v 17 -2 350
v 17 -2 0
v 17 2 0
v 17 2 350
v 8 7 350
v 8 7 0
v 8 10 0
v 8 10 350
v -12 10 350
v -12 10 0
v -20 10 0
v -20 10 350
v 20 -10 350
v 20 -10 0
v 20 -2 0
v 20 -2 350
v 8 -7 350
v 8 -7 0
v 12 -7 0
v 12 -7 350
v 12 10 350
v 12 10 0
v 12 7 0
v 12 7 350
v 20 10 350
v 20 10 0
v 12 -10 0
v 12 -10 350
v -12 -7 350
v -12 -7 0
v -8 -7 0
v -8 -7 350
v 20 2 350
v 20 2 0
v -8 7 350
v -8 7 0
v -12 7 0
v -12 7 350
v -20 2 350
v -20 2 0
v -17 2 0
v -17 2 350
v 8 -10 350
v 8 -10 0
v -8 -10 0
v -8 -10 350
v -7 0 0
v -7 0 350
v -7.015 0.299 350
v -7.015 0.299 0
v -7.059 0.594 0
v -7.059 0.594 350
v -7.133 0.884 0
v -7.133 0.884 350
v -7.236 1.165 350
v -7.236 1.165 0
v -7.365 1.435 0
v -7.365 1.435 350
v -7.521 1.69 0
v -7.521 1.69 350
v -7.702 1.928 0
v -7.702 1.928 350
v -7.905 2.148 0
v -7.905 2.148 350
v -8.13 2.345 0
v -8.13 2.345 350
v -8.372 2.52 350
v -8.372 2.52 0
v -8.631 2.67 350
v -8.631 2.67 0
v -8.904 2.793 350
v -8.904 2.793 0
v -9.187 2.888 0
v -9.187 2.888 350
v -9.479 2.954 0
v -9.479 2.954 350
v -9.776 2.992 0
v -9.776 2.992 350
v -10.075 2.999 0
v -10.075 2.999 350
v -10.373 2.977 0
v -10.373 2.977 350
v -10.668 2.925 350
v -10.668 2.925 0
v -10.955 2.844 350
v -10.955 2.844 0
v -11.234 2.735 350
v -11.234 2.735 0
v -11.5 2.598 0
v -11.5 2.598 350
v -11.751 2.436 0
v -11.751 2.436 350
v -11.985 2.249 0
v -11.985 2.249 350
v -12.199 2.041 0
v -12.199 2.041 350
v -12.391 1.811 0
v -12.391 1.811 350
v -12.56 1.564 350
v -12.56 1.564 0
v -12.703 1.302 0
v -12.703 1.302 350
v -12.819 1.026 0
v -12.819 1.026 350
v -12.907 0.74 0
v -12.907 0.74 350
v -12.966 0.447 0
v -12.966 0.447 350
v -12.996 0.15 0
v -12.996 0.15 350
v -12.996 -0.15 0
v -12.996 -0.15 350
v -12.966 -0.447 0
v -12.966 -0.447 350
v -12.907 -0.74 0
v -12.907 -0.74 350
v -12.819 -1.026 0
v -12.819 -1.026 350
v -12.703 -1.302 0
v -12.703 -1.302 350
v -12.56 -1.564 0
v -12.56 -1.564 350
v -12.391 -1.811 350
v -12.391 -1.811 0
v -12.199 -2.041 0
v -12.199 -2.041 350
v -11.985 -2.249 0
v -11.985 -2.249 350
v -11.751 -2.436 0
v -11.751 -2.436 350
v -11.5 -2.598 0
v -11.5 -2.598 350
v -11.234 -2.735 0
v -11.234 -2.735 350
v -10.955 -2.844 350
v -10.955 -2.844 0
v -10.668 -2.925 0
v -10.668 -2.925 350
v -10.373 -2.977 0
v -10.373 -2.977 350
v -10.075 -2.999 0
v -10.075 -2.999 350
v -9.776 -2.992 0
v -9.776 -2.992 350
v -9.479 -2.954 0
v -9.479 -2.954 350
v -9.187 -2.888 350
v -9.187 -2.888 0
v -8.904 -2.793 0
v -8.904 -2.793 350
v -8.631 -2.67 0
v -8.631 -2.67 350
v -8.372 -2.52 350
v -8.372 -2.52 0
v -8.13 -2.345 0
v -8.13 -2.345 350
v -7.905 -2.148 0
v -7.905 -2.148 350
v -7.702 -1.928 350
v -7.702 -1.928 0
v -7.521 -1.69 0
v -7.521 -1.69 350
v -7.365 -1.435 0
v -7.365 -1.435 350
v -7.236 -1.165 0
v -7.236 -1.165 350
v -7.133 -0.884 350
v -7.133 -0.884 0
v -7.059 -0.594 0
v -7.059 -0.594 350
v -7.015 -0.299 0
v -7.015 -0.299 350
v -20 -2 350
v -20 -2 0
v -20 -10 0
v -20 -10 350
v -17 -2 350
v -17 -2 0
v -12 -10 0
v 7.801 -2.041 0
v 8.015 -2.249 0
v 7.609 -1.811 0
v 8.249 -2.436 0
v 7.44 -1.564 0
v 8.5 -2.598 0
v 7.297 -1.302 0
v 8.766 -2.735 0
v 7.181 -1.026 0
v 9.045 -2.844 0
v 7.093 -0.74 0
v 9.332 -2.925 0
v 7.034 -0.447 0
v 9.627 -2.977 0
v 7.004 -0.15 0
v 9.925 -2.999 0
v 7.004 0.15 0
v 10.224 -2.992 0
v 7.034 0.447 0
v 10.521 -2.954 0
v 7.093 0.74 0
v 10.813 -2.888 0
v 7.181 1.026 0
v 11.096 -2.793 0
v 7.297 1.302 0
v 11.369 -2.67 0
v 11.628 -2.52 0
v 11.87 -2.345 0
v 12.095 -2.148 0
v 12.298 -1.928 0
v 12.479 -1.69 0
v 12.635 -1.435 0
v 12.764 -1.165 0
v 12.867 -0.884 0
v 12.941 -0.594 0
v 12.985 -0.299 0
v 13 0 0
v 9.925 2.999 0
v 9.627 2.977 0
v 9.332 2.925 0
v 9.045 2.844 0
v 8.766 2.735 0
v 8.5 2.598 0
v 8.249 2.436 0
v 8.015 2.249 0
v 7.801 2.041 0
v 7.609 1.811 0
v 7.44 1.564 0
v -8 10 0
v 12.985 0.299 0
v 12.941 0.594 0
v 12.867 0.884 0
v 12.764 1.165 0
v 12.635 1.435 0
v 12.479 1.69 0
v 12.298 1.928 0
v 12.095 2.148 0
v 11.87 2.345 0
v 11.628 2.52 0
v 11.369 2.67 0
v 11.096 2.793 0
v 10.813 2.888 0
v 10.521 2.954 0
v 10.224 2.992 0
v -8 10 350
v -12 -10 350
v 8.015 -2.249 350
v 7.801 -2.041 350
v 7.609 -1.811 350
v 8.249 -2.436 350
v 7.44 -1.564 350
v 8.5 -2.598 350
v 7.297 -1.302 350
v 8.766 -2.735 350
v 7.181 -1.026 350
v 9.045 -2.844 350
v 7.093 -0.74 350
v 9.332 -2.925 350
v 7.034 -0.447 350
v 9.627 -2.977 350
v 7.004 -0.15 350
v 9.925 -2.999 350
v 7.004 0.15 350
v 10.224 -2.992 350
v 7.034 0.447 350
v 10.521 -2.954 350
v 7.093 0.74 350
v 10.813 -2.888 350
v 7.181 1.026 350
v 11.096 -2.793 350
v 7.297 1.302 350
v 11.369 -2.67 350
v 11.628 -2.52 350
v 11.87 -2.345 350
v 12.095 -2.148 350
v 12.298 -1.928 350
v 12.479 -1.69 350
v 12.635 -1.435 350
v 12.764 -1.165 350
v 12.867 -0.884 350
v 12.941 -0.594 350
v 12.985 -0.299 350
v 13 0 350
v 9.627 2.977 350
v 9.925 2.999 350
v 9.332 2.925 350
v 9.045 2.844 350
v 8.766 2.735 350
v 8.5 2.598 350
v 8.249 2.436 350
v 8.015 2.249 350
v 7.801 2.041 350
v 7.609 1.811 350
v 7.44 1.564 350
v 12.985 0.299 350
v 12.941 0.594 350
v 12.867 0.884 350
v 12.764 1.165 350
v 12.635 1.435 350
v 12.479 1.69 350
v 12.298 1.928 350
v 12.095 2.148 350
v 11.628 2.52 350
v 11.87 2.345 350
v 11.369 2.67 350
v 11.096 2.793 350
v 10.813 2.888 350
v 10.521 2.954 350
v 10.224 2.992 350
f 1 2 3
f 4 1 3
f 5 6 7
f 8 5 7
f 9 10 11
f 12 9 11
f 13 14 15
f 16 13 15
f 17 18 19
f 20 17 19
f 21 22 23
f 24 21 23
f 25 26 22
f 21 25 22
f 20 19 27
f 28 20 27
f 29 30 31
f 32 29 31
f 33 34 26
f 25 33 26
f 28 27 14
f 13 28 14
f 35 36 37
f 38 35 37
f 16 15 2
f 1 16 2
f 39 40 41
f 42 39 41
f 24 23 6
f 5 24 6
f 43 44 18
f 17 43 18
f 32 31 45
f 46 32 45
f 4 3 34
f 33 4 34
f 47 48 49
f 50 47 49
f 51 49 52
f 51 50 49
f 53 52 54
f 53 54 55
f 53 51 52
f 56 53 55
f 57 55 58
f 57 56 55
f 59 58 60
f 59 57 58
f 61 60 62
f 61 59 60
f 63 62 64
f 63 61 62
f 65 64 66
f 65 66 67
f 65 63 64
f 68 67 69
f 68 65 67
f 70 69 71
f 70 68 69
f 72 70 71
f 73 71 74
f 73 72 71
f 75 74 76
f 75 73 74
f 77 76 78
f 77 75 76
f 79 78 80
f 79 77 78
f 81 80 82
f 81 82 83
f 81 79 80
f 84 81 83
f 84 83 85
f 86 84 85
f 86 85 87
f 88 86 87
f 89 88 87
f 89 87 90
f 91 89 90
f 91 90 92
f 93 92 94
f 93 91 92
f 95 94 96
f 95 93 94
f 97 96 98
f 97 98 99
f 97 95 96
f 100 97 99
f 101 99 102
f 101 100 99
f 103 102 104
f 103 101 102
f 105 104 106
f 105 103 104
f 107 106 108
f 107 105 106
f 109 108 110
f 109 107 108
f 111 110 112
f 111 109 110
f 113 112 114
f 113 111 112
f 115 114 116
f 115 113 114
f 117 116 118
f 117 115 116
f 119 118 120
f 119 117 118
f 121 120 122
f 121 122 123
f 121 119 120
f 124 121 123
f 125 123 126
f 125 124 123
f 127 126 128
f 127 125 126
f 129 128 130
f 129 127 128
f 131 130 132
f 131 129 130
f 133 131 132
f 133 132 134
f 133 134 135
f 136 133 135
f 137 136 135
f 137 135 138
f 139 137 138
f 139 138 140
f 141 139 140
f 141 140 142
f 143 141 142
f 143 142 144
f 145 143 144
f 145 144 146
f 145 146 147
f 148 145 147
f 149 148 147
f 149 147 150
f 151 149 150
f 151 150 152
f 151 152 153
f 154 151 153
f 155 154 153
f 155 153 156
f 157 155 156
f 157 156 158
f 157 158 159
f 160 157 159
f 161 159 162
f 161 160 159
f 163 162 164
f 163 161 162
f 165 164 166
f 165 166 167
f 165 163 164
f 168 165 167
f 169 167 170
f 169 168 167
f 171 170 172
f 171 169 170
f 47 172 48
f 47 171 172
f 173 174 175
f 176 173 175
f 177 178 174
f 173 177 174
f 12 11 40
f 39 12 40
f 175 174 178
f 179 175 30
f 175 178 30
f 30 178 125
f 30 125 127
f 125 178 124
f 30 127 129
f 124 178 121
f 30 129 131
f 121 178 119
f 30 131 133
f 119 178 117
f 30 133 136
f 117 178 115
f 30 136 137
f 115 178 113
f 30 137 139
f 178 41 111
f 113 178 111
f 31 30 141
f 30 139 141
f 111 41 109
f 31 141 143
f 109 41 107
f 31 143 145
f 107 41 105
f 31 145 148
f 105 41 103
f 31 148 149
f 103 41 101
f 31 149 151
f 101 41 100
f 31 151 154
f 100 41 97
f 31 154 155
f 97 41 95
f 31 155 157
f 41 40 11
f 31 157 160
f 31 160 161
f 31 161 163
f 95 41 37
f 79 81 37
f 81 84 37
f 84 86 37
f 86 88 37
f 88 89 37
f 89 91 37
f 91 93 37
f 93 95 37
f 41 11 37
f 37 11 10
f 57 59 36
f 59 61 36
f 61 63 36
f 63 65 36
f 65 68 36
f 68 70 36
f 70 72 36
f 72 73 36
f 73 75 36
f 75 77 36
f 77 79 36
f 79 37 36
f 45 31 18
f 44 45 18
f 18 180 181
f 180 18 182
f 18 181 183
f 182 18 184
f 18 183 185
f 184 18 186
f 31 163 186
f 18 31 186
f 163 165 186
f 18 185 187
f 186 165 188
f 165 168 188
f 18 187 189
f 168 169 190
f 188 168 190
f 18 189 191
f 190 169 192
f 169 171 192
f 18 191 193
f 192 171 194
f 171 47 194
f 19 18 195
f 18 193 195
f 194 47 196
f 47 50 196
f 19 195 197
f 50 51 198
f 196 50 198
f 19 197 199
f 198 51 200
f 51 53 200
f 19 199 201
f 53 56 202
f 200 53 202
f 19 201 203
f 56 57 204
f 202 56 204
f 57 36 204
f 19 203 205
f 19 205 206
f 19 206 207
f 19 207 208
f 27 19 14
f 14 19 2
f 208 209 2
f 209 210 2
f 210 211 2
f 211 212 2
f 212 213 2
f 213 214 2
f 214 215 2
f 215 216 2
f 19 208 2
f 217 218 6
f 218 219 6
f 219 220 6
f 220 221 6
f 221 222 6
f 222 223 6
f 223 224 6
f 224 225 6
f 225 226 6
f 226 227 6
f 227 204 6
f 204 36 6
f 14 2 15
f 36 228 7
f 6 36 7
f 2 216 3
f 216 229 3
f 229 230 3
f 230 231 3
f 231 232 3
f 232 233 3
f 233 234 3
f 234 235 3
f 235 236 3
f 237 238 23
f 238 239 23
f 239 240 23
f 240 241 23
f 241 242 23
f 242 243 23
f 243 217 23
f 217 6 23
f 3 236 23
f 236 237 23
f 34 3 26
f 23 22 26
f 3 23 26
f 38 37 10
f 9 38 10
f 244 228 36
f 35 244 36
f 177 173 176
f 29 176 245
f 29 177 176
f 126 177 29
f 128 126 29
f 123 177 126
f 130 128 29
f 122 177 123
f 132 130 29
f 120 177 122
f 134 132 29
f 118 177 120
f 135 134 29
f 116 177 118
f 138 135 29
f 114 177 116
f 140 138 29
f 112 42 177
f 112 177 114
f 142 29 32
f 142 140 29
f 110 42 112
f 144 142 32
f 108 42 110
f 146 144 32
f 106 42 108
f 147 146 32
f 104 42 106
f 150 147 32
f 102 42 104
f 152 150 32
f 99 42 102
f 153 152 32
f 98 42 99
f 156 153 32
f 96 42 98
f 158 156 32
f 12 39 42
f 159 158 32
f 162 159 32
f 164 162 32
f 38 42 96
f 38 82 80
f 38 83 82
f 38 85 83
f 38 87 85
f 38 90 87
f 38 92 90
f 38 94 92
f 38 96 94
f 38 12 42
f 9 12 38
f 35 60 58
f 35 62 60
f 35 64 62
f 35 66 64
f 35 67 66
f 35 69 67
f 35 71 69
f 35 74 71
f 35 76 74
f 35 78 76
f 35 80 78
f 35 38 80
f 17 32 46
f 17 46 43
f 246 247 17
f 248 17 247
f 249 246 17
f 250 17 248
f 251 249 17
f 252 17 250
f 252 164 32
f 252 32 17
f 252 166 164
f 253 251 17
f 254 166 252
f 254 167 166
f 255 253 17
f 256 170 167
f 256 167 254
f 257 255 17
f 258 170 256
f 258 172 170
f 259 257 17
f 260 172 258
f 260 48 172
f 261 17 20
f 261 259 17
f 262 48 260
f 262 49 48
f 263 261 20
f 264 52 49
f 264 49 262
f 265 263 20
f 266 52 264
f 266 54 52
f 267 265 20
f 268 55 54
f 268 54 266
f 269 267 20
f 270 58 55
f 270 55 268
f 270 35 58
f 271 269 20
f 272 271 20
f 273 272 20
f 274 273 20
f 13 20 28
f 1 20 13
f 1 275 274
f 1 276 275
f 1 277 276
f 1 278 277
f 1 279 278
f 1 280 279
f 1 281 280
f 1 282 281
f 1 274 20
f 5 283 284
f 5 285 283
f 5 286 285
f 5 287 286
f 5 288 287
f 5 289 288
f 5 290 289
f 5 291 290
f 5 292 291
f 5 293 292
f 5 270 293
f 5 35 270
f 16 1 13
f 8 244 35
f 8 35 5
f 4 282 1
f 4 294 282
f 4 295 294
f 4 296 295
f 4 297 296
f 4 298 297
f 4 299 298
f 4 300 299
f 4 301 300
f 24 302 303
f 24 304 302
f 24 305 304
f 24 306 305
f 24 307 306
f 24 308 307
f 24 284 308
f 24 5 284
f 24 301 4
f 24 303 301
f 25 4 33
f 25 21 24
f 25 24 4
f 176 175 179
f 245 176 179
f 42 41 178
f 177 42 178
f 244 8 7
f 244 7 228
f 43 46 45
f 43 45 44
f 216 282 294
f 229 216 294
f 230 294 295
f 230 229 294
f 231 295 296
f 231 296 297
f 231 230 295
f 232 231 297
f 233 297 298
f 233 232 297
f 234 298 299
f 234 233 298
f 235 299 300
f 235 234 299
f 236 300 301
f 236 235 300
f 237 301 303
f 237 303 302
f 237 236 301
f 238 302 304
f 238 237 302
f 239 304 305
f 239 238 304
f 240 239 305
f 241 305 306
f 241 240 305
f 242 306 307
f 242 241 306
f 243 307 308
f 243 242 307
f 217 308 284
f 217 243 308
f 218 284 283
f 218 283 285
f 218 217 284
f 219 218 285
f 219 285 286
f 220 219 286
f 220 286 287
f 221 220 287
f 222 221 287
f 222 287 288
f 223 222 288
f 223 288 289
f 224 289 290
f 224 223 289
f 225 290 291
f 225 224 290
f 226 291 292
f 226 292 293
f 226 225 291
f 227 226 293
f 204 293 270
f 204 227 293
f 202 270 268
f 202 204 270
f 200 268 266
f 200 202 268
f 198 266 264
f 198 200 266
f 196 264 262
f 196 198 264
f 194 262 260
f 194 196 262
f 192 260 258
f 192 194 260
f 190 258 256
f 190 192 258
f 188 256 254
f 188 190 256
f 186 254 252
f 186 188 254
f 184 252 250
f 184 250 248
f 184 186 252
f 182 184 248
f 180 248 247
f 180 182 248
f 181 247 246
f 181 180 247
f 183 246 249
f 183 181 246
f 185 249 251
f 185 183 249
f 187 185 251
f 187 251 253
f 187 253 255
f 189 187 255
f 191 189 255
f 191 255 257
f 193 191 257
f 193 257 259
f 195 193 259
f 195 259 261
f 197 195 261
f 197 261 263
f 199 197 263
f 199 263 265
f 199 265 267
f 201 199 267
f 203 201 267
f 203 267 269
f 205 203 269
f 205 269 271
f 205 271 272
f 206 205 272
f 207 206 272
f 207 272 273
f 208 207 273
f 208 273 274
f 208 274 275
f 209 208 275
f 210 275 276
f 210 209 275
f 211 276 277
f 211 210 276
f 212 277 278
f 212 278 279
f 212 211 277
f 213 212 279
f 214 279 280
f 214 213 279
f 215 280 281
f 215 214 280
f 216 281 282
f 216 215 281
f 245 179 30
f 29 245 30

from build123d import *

# Parameters (mm, degrees)
F0_R     = 3
F1_DEPTH = 350


with BuildPart() as f1:
    # F0 (on Top) → F1 (new body)
    with BuildSketch(Plane.XY):
        Polygon((-12, 10), (-20, 10), (-20, 2), (-17, 2), (-17, -2), (-20, -2), (-20, -10), (-12, -10), (-12, -7), (-8, -7), (-8, -10), (8, -10), (8, -7), (12, -7), (12, -10), (20, -10), (20, -2), (17, -2), (17, 2), (20, 2), (20, 10), (12, 10), (12, 7), (8, 7), (8, 10), (-8, 10), (-8, 7), (-12, 7), align=None)
        with Locations((-10, 0)):
            Circle(F0_R, mode=Mode.SUBTRACT)
        with Locations((10, 0)):
            Circle(F0_R, mode=Mode.SUBTRACT)
    extrude(amount=F1_DEPTH)


solid = f1.part
